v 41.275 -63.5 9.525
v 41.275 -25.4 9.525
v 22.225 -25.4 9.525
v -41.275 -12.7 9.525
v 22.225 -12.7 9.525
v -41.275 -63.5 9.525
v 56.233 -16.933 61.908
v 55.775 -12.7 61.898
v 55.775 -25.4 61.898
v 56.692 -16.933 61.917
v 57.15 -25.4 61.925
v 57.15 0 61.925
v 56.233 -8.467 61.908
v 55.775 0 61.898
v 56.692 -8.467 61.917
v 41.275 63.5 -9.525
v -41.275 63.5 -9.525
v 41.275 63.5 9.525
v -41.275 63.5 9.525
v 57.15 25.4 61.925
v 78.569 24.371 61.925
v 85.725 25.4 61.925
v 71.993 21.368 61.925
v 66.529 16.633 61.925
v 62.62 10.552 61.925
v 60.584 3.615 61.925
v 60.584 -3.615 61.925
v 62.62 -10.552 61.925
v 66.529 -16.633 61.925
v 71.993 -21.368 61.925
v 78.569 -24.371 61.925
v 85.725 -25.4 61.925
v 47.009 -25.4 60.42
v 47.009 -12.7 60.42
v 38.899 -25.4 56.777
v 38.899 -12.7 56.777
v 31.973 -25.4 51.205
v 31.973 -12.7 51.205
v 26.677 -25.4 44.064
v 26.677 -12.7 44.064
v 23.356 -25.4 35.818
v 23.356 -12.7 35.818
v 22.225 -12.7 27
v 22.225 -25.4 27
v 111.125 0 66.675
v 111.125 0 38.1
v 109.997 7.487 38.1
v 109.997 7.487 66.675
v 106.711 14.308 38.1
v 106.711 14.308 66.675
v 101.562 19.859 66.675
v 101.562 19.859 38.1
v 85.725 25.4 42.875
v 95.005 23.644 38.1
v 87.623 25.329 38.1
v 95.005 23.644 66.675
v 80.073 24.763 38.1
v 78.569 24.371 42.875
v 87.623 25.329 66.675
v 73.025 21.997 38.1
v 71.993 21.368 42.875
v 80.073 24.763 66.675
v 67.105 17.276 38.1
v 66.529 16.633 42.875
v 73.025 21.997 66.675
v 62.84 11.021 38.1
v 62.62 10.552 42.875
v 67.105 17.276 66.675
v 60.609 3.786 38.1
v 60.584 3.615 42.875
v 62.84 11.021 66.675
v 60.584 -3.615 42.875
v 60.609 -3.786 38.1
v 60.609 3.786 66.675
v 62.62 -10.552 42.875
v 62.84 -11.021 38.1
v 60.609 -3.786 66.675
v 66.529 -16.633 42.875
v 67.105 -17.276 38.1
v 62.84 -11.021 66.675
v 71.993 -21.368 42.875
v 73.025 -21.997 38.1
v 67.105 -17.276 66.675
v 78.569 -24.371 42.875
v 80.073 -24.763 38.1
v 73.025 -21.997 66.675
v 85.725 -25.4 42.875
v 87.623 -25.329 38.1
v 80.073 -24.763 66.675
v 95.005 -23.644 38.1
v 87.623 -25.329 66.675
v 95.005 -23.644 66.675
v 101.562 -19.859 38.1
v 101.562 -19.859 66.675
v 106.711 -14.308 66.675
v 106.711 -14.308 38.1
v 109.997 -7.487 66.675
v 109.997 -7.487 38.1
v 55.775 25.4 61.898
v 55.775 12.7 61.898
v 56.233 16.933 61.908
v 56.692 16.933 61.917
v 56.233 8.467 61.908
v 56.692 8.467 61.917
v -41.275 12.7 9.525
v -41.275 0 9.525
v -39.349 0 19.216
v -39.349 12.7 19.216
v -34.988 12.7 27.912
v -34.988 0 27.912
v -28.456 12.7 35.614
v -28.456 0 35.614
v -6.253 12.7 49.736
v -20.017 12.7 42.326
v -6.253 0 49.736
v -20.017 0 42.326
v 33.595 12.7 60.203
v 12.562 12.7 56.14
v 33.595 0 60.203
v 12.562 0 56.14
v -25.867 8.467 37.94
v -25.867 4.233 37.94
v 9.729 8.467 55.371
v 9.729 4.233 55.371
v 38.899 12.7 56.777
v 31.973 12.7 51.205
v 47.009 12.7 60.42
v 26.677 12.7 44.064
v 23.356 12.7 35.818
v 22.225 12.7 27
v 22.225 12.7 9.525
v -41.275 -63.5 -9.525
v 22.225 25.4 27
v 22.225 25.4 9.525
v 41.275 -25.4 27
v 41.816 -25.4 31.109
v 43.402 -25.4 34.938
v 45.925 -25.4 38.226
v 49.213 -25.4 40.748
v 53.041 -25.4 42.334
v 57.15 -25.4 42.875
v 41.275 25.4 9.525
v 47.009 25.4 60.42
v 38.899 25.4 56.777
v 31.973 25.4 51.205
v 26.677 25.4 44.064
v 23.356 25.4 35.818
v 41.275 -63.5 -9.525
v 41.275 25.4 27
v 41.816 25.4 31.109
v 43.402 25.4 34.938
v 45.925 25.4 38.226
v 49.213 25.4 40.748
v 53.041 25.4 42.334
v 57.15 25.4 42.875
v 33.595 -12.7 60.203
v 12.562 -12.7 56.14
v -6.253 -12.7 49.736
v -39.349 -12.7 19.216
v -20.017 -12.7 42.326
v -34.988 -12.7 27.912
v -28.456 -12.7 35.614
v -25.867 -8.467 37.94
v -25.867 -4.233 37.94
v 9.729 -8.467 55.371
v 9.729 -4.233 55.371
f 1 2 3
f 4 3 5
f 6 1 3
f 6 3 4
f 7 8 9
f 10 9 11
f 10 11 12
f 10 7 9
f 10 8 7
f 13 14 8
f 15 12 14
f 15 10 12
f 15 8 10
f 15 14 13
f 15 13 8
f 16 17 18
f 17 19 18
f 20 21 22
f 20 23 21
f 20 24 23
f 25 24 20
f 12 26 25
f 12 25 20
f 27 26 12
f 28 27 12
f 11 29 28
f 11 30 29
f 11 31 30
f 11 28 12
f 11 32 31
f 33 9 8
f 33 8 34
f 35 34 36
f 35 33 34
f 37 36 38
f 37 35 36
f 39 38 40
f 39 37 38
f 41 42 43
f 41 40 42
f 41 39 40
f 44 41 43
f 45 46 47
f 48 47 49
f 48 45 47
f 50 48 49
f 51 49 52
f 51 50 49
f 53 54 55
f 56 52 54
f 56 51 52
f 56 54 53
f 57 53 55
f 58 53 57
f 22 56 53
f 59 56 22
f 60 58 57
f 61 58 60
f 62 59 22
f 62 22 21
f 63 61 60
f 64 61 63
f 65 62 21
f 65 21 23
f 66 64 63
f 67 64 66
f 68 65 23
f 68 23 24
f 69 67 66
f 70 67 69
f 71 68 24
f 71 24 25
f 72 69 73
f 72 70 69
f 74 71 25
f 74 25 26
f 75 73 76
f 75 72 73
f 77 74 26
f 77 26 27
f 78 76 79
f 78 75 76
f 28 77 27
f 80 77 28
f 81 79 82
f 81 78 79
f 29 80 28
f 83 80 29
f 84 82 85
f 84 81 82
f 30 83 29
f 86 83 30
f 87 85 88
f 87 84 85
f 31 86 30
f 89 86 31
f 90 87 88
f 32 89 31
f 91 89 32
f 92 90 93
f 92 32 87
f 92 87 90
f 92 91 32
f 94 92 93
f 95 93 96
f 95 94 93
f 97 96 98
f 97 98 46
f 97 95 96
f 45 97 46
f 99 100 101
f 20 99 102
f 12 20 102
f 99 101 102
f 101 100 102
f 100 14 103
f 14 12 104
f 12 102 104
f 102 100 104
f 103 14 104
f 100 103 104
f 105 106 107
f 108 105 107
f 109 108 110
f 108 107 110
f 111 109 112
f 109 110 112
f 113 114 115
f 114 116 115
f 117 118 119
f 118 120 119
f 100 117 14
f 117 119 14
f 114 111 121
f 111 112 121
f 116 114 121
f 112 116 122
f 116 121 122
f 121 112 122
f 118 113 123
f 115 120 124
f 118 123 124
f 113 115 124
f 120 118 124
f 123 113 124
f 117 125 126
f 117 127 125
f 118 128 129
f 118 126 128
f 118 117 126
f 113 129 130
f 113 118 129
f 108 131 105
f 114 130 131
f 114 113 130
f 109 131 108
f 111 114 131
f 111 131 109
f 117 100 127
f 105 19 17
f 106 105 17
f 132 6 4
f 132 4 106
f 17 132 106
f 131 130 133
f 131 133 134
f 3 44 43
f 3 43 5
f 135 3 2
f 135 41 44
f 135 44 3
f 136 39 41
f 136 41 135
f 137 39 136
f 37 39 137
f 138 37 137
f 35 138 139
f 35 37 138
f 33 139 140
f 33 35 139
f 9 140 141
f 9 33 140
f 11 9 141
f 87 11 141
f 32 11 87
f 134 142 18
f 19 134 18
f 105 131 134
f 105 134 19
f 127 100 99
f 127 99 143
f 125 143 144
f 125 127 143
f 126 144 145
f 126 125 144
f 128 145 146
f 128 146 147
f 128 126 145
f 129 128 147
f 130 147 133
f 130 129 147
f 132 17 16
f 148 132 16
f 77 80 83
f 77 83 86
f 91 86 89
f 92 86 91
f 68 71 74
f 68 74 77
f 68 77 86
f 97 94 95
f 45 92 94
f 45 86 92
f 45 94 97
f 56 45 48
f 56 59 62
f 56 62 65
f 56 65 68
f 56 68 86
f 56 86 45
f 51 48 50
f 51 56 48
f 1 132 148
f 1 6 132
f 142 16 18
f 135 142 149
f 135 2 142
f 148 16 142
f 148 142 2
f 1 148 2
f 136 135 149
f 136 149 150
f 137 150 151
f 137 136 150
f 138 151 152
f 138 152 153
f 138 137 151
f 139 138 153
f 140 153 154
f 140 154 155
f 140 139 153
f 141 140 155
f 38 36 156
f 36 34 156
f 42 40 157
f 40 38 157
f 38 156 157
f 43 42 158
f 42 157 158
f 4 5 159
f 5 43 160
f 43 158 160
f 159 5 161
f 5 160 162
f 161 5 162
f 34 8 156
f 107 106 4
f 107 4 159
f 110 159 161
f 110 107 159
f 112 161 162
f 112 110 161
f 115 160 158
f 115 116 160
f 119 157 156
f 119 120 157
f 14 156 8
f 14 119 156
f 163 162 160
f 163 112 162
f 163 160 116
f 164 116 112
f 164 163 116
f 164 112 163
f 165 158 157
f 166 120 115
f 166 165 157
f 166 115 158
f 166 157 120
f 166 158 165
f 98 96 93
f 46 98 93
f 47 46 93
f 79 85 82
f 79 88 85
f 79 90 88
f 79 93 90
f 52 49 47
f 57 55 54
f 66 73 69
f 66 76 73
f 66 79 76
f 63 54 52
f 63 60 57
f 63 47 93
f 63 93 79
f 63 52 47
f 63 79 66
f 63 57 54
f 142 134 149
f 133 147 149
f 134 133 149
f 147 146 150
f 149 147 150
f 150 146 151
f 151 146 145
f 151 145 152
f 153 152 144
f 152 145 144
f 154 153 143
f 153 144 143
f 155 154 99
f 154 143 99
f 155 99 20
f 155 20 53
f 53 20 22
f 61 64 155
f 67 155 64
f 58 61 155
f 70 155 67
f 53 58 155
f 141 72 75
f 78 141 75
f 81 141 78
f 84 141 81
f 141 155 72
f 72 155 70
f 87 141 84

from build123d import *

# Parameters (mm, degrees)
F1_DEPTH = 63.5
F0_W     = 25.4
F0_H     = 19.05
F2_DEPTH = 25.4
F3_DEPTH = 12.7


with BuildPart() as f1:
    # F0 (on Front) → F1 (new body, symmetric)
    with BuildSketch(Plane.XZ):
        Polygon((-41.275, -9.525), (41.275, -9.525), (41.275, 9.525), (22.225, 9.525), (-41.275, 9.525), align=None)
    extrude(amount=F1_DEPTH, both=True)

    # F0 (on Front) → F2 (join, symmetric)
    with BuildSketch(Plane.XZ):
        with BuildLine():
            Line((22.225, 9.525), (41.275, 9.525))
            Line((41.275, 9.525), (41.275, 27.0002))
            ThreePointArc((41.275, 27.0002), (45.9246798487, 38.2255201513), (57.15, 42.8752))
            Line((57.15, 42.8752), (60.325, 42.8752))
            Line((60.325, 42.8752), (60.325, 61.9252))
            Line((60.325, 61.9252), (57.15, 61.9252))
            add(Edge.make_bspline(
                [(55.7747590851, 61.8981130812), (56.2330882006, 61.9086209195), (56.6915145362, 61.9176497894), (57.15, 61.9252)],
                knots=[110.4504448216, 110.4504448216, 110.4504448216, 110.4504448216, 111.5045361635, 111.5045361635, 111.5045361635, 111.5045361635], degree=3))
            ThreePointArc((55.7747590851, 61.8981130812), (31.9727690765, 51.2048001418), (22.225, 27.0002))
            Line((22.225, 27.0002), (22.225, 9.525))
        make_face()
        with Locations((73.025, 52.4002)):
            Rectangle(F0_W, F0_H)
    extrude(amount=F2_DEPTH, both=True)

    # F0 (on Front) → F3 (join, symmetric)
    with BuildSketch(Plane.XZ):
        with BuildLine():
            add(Edge.make_bspline(
                [(-41.275, 9.525), (-39.2076677015, 43.4578572164), (7.7498368859, 60.7970743394), (55.7747590851, 61.8981130812)],
                knots=[0, 0, 0, 0, 110.4504448216, 110.4504448216, 110.4504448216, 110.4504448216], degree=3))
            Line((-41.275, 9.525), (22.225, 9.525))
            Line((22.225, 9.525), (22.225, 27.0002))
            ThreePointArc((22.225, 27.0002), (31.9727690765, 51.2048001418), (55.7747590851, 61.8981130812))
        make_face()
    extrude(amount=F3_DEPTH, both=True)

    # F0 (on Front) → F4 (revolve)
    with BuildSketch(Plane.XZ):
        Polygon((85.725, 61.9252), (85.725, 42.8752), (85.725, 38.1), (111.125, 38.1), (111.125, 66.675), (85.725, 66.675), align=None)
    revolve(axis=Axis((85.725, 0, 52.3875), (0, 0, 1)))


solid = f1.part
